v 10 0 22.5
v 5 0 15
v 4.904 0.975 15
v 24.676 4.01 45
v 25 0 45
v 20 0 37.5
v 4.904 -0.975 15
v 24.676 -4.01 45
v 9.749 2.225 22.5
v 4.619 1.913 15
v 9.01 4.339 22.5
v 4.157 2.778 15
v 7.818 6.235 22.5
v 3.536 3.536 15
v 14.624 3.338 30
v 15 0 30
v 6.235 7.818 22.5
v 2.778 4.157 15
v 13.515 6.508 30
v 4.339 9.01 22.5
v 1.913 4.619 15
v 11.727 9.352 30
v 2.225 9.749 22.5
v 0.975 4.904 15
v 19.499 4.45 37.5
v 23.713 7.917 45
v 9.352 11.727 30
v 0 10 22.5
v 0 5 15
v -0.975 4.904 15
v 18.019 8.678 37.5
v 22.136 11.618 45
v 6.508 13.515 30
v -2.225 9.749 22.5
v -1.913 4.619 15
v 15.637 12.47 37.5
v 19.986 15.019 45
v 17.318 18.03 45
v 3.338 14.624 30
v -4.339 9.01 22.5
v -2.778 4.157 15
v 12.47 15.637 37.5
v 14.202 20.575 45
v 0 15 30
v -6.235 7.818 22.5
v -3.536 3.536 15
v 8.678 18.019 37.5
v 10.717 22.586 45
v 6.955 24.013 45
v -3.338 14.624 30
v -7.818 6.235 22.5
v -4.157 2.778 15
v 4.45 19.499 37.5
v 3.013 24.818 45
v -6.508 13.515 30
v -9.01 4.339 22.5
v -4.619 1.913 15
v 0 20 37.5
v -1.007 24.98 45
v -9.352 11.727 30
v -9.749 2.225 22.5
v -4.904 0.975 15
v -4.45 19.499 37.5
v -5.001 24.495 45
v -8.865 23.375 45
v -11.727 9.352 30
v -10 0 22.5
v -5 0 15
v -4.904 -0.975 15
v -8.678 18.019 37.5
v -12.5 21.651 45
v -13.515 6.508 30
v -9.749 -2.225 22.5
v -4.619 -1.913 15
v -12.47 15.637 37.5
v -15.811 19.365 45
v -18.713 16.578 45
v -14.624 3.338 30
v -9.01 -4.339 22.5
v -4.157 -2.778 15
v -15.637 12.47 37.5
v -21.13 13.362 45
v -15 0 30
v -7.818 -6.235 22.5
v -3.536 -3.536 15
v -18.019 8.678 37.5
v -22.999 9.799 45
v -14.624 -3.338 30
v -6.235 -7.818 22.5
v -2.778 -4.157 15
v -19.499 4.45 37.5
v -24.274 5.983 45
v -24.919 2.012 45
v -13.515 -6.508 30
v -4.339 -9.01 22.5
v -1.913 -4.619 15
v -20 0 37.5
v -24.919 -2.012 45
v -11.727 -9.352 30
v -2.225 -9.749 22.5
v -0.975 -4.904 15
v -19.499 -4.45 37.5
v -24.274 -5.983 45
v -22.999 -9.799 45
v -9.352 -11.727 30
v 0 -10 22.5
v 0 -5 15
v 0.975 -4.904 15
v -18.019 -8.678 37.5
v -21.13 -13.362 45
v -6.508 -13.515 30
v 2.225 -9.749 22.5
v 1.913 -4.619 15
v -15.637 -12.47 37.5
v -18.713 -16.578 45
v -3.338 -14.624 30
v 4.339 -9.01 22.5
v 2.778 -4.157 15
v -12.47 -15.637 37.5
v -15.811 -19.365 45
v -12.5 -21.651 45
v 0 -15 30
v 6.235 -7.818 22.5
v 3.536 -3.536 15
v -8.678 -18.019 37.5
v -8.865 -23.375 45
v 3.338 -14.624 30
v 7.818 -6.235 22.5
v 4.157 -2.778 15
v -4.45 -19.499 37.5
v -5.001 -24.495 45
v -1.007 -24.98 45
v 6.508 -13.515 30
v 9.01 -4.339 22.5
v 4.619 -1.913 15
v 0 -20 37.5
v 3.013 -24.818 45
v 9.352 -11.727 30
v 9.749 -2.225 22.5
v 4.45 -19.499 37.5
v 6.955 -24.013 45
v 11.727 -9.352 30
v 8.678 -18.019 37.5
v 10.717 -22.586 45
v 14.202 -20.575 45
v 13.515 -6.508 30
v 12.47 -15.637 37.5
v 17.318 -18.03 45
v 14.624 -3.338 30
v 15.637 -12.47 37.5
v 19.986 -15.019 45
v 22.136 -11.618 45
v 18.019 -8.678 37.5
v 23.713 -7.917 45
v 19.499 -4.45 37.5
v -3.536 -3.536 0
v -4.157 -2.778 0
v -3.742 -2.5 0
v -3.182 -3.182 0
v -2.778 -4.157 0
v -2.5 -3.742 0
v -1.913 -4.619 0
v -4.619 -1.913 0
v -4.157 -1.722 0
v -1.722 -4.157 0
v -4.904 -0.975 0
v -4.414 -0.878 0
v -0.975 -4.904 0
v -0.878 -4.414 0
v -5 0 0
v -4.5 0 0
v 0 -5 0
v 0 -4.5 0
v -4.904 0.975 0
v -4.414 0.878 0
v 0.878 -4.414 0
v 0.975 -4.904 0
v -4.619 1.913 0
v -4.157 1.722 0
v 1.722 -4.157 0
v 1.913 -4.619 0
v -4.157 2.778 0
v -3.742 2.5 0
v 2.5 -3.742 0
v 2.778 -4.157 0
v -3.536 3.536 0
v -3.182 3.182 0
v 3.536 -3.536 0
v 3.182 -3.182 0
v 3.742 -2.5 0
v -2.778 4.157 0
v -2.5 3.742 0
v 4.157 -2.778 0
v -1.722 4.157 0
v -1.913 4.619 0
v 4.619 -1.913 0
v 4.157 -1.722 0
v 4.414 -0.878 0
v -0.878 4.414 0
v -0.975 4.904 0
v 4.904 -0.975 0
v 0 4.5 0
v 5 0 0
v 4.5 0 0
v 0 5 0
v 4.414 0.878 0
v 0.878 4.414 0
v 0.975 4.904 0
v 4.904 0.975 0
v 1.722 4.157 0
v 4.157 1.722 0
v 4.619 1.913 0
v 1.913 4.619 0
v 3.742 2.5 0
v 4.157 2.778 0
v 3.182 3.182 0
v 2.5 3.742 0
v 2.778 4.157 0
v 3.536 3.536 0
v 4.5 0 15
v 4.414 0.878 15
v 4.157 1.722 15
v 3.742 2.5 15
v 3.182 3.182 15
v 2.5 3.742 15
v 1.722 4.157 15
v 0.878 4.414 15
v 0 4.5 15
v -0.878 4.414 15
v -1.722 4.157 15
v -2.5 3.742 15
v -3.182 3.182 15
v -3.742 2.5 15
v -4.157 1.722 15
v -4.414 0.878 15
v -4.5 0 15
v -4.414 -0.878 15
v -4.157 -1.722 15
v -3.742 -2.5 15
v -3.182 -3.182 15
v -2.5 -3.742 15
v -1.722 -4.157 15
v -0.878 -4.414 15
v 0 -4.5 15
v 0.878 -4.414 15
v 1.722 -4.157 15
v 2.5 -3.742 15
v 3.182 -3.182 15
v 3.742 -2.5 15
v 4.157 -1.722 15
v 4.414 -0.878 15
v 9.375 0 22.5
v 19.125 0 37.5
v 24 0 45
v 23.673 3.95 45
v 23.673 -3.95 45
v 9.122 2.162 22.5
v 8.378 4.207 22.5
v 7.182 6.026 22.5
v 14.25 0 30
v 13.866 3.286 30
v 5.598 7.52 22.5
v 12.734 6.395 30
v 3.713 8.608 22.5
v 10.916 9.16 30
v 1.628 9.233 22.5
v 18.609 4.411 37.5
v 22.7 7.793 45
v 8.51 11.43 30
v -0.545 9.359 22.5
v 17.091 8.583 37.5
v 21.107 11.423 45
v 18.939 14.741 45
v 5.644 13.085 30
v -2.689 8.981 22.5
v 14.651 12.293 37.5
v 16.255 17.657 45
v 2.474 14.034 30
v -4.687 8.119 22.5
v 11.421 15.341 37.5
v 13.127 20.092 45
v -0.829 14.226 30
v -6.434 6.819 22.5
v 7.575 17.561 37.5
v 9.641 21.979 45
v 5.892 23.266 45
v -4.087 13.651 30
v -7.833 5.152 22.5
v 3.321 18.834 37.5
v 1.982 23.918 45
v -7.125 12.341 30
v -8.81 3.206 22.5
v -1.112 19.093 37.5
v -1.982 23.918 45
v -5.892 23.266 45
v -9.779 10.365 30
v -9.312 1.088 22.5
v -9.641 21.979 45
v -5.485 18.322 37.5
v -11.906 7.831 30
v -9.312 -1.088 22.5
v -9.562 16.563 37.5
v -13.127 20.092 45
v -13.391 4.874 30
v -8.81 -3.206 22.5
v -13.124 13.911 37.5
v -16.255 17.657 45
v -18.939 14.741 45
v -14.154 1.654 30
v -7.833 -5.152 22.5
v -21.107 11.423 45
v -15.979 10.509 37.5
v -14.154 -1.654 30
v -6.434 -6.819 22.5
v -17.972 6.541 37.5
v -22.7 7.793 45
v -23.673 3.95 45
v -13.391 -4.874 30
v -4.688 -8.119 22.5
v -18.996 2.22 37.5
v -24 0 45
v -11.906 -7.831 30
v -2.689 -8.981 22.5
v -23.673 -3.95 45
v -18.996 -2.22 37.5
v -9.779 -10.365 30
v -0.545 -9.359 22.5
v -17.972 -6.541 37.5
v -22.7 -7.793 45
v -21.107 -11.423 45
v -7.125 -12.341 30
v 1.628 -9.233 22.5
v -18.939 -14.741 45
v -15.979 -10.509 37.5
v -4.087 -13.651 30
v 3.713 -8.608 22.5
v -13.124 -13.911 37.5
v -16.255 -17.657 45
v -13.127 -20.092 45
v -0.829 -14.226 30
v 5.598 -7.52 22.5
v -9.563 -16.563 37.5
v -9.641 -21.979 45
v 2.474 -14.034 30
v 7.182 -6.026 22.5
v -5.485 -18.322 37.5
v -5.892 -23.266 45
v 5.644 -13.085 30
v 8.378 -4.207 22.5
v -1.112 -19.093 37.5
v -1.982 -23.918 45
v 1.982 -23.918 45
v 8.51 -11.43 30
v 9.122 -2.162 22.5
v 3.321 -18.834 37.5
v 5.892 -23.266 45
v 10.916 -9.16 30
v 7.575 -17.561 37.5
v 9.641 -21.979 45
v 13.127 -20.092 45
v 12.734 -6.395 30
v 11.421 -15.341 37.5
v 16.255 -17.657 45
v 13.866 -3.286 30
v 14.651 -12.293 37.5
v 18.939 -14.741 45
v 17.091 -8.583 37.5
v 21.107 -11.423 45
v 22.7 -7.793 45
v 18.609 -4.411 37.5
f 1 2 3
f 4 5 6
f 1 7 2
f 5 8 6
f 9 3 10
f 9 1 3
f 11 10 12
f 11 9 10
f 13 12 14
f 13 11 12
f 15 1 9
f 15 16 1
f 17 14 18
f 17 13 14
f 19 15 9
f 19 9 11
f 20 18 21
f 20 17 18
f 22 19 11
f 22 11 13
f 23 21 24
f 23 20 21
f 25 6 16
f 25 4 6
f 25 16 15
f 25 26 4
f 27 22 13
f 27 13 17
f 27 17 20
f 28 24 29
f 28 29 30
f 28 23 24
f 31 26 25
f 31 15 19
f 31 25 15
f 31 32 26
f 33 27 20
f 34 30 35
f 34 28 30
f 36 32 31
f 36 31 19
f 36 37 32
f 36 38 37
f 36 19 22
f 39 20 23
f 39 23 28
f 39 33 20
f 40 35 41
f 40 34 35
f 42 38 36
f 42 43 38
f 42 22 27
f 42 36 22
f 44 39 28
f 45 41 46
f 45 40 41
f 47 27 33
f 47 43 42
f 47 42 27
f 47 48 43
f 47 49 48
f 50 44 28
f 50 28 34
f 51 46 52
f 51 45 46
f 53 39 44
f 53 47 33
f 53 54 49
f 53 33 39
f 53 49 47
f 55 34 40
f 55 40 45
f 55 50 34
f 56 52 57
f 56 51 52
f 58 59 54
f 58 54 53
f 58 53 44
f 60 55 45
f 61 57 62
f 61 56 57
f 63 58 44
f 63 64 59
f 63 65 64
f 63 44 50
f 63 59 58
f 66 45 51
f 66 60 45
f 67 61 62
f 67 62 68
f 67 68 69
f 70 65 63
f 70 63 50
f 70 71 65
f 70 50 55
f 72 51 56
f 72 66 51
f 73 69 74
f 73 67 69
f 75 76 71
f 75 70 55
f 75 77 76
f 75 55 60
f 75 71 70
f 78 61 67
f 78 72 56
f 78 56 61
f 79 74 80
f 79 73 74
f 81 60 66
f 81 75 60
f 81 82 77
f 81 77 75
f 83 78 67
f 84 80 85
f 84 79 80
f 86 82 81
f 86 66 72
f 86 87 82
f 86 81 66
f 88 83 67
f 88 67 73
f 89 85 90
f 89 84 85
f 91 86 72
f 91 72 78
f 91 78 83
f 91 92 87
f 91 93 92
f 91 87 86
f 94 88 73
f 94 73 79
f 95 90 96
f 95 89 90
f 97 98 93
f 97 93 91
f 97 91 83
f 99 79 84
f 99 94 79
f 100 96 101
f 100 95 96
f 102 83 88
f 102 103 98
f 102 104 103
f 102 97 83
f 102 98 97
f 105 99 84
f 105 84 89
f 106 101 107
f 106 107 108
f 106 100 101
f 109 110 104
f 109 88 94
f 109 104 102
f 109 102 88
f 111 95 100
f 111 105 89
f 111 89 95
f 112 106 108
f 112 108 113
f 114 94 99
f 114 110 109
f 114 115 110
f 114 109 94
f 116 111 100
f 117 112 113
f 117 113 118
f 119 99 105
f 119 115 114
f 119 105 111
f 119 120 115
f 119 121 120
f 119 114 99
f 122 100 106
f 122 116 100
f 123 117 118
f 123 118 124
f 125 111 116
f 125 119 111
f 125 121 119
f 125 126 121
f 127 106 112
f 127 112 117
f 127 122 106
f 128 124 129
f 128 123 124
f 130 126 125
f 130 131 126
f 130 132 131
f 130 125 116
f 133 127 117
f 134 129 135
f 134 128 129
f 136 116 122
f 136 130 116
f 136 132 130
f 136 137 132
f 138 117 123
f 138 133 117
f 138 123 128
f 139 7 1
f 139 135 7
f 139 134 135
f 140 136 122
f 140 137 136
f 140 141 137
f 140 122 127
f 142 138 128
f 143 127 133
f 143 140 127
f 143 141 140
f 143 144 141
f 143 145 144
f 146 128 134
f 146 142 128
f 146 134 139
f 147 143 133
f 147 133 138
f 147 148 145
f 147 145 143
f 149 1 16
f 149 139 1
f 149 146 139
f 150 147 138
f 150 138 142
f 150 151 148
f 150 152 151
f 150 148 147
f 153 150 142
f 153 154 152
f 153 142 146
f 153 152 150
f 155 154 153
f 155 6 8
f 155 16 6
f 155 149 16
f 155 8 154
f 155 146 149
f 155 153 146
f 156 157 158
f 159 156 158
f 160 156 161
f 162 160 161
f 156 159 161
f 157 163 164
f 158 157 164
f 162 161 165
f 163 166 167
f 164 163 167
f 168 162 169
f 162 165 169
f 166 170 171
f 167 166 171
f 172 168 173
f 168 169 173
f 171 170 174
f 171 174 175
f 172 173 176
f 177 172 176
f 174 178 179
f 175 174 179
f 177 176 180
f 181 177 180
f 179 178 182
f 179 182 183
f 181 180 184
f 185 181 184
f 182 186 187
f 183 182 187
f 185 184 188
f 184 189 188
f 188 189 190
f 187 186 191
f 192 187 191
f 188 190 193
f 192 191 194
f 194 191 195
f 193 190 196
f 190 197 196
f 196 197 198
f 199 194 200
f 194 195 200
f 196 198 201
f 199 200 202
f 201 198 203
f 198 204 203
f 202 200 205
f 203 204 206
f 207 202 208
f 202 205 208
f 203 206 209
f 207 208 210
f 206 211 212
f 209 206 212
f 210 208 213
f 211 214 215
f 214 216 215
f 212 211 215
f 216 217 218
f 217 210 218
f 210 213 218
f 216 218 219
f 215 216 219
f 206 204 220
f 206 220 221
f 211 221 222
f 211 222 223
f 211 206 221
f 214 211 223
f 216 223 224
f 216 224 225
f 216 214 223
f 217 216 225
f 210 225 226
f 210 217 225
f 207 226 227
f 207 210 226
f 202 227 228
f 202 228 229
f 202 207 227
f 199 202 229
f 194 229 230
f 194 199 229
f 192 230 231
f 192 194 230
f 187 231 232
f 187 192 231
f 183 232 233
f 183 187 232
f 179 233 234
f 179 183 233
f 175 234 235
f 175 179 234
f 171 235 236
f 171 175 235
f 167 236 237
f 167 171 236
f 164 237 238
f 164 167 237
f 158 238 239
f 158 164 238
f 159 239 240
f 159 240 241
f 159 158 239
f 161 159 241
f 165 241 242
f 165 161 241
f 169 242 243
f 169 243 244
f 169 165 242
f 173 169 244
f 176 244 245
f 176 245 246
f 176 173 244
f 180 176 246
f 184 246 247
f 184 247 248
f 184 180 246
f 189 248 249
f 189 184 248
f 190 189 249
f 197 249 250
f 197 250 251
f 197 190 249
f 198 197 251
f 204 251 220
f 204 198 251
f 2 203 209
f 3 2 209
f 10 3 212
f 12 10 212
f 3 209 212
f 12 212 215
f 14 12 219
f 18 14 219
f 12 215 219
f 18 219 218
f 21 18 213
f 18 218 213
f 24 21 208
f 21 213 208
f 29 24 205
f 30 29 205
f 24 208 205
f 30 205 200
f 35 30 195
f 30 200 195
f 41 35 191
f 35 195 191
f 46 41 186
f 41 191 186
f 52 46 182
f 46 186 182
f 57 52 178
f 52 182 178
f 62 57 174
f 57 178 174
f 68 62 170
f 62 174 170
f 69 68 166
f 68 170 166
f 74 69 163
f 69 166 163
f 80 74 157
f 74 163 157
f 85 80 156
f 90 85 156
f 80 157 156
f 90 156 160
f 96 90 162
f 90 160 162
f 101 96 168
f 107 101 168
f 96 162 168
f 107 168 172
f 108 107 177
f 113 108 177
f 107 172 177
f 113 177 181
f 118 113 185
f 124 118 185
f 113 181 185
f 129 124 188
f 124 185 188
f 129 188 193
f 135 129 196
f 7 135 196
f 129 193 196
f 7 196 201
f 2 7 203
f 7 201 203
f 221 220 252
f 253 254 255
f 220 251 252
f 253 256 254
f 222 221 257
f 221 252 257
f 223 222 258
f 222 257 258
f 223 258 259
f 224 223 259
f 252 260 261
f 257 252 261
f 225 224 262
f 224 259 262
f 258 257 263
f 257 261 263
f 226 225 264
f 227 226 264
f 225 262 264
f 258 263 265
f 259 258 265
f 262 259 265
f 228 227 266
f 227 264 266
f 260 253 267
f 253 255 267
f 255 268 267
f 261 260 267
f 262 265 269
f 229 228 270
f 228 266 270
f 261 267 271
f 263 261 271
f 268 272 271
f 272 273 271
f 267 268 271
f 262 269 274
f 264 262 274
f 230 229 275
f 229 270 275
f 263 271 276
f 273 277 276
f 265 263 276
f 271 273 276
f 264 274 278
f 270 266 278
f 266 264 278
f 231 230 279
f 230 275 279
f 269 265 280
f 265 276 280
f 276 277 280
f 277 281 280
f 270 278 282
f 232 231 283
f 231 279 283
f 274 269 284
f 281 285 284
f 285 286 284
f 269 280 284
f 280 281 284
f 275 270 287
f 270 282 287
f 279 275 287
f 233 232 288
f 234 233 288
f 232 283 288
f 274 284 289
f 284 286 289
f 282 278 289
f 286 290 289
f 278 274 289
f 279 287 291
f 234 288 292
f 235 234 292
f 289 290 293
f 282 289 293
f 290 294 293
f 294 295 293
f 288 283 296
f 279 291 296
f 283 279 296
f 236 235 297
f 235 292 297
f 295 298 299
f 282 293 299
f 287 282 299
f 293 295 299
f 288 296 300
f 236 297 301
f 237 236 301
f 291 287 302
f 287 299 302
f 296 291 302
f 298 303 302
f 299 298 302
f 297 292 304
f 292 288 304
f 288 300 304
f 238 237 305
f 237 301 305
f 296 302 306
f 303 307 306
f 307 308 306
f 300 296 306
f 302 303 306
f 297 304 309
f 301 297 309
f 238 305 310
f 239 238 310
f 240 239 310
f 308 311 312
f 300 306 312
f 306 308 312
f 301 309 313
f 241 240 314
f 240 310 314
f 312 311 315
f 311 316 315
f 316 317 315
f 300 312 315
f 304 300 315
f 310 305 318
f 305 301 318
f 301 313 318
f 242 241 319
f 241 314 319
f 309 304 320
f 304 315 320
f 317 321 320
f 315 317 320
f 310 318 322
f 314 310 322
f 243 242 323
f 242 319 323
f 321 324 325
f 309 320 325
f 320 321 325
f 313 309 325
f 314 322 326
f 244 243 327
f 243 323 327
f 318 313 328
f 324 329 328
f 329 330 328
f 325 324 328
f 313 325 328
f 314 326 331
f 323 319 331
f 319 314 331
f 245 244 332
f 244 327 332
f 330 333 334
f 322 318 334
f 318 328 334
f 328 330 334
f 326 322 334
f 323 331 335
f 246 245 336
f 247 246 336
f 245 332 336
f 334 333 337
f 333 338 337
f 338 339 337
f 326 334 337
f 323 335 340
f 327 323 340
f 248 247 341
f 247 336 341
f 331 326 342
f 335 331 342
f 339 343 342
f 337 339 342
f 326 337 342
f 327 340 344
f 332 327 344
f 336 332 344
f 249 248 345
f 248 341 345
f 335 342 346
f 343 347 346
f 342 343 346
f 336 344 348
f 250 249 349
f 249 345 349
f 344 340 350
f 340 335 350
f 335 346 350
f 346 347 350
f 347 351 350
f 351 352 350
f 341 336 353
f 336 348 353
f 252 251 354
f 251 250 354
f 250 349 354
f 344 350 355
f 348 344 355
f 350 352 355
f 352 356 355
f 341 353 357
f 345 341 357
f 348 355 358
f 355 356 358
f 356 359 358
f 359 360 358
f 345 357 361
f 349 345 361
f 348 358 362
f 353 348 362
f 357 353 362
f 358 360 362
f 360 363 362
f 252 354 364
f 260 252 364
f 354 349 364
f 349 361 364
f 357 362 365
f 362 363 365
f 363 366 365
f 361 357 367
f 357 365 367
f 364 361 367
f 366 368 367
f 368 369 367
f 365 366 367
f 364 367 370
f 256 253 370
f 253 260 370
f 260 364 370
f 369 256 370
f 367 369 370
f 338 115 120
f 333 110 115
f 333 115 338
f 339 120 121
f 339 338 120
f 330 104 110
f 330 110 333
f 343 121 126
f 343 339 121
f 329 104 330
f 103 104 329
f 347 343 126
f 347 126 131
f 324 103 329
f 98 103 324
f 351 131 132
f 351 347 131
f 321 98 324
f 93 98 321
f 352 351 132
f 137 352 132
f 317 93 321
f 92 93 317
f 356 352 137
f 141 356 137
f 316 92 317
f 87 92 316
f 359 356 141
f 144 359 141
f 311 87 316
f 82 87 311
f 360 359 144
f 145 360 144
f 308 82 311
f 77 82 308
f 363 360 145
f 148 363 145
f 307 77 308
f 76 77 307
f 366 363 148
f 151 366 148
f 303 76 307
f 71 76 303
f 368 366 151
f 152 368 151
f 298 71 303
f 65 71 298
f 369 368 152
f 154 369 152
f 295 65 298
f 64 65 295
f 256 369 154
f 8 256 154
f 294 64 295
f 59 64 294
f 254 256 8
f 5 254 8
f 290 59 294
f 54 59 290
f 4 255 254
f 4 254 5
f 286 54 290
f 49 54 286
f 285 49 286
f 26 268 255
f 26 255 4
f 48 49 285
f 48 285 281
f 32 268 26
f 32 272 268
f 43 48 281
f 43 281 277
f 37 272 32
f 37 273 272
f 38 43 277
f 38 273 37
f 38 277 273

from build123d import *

# Parameters (mm, degrees)
CYLINDER001_R     = 4.5
CYLINDER001_DEPTH = 15
CYLINDER_R        = 5
CYLINDER_DEPTH    = 15


with BuildPart() as cilindre001:
    # Cylinder001 → Cylinder001 (new body)
    with BuildSketch(Plane.XY):
        Circle(CYLINDER001_R)
    extrude(amount=CYLINDER001_DEPTH)


with BuildPart() as cut:
    # Cylinder → Cylinder (new body)
    with BuildSketch(Plane.XY):
        Circle(CYLINDER_R)
    extrude(amount=CYLINDER_DEPTH)

    # Cut: cut Cilindre001
    add(cilindre001.part, mode=Mode.SUBTRACT)


with BuildPart() as con001:
    # Cone001 → Cone001 (revolve)
    with BuildSketch(Plane(origin=(0, 0, 15), x_dir=(1, 0, 0), z_dir=(0, -1, 0))):
        Polygon((0, 0), (4.5, 0), (24, 30), (0, 30), align=None)
    revolve(axis=Axis((0, 0, 15), (0, 0, 1)))


with BuildPart() as fusion:
    # Cone → Cone (revolve)
    with BuildSketch(Plane(origin=(0, 0, 15), x_dir=(1, 0, 0), z_dir=(0, -1, 0))):
        Polygon((0, 0), (5, 0), (25, 30), (0, 30), align=None)
    revolve(axis=Axis((0, 0, 15), (0, 0, 1)))

    # Cut001: cut Con001
    add(con001.part, mode=Mode.SUBTRACT)

    # Fusion: union Cut
    add(cut.part)


solid = fusion.part
